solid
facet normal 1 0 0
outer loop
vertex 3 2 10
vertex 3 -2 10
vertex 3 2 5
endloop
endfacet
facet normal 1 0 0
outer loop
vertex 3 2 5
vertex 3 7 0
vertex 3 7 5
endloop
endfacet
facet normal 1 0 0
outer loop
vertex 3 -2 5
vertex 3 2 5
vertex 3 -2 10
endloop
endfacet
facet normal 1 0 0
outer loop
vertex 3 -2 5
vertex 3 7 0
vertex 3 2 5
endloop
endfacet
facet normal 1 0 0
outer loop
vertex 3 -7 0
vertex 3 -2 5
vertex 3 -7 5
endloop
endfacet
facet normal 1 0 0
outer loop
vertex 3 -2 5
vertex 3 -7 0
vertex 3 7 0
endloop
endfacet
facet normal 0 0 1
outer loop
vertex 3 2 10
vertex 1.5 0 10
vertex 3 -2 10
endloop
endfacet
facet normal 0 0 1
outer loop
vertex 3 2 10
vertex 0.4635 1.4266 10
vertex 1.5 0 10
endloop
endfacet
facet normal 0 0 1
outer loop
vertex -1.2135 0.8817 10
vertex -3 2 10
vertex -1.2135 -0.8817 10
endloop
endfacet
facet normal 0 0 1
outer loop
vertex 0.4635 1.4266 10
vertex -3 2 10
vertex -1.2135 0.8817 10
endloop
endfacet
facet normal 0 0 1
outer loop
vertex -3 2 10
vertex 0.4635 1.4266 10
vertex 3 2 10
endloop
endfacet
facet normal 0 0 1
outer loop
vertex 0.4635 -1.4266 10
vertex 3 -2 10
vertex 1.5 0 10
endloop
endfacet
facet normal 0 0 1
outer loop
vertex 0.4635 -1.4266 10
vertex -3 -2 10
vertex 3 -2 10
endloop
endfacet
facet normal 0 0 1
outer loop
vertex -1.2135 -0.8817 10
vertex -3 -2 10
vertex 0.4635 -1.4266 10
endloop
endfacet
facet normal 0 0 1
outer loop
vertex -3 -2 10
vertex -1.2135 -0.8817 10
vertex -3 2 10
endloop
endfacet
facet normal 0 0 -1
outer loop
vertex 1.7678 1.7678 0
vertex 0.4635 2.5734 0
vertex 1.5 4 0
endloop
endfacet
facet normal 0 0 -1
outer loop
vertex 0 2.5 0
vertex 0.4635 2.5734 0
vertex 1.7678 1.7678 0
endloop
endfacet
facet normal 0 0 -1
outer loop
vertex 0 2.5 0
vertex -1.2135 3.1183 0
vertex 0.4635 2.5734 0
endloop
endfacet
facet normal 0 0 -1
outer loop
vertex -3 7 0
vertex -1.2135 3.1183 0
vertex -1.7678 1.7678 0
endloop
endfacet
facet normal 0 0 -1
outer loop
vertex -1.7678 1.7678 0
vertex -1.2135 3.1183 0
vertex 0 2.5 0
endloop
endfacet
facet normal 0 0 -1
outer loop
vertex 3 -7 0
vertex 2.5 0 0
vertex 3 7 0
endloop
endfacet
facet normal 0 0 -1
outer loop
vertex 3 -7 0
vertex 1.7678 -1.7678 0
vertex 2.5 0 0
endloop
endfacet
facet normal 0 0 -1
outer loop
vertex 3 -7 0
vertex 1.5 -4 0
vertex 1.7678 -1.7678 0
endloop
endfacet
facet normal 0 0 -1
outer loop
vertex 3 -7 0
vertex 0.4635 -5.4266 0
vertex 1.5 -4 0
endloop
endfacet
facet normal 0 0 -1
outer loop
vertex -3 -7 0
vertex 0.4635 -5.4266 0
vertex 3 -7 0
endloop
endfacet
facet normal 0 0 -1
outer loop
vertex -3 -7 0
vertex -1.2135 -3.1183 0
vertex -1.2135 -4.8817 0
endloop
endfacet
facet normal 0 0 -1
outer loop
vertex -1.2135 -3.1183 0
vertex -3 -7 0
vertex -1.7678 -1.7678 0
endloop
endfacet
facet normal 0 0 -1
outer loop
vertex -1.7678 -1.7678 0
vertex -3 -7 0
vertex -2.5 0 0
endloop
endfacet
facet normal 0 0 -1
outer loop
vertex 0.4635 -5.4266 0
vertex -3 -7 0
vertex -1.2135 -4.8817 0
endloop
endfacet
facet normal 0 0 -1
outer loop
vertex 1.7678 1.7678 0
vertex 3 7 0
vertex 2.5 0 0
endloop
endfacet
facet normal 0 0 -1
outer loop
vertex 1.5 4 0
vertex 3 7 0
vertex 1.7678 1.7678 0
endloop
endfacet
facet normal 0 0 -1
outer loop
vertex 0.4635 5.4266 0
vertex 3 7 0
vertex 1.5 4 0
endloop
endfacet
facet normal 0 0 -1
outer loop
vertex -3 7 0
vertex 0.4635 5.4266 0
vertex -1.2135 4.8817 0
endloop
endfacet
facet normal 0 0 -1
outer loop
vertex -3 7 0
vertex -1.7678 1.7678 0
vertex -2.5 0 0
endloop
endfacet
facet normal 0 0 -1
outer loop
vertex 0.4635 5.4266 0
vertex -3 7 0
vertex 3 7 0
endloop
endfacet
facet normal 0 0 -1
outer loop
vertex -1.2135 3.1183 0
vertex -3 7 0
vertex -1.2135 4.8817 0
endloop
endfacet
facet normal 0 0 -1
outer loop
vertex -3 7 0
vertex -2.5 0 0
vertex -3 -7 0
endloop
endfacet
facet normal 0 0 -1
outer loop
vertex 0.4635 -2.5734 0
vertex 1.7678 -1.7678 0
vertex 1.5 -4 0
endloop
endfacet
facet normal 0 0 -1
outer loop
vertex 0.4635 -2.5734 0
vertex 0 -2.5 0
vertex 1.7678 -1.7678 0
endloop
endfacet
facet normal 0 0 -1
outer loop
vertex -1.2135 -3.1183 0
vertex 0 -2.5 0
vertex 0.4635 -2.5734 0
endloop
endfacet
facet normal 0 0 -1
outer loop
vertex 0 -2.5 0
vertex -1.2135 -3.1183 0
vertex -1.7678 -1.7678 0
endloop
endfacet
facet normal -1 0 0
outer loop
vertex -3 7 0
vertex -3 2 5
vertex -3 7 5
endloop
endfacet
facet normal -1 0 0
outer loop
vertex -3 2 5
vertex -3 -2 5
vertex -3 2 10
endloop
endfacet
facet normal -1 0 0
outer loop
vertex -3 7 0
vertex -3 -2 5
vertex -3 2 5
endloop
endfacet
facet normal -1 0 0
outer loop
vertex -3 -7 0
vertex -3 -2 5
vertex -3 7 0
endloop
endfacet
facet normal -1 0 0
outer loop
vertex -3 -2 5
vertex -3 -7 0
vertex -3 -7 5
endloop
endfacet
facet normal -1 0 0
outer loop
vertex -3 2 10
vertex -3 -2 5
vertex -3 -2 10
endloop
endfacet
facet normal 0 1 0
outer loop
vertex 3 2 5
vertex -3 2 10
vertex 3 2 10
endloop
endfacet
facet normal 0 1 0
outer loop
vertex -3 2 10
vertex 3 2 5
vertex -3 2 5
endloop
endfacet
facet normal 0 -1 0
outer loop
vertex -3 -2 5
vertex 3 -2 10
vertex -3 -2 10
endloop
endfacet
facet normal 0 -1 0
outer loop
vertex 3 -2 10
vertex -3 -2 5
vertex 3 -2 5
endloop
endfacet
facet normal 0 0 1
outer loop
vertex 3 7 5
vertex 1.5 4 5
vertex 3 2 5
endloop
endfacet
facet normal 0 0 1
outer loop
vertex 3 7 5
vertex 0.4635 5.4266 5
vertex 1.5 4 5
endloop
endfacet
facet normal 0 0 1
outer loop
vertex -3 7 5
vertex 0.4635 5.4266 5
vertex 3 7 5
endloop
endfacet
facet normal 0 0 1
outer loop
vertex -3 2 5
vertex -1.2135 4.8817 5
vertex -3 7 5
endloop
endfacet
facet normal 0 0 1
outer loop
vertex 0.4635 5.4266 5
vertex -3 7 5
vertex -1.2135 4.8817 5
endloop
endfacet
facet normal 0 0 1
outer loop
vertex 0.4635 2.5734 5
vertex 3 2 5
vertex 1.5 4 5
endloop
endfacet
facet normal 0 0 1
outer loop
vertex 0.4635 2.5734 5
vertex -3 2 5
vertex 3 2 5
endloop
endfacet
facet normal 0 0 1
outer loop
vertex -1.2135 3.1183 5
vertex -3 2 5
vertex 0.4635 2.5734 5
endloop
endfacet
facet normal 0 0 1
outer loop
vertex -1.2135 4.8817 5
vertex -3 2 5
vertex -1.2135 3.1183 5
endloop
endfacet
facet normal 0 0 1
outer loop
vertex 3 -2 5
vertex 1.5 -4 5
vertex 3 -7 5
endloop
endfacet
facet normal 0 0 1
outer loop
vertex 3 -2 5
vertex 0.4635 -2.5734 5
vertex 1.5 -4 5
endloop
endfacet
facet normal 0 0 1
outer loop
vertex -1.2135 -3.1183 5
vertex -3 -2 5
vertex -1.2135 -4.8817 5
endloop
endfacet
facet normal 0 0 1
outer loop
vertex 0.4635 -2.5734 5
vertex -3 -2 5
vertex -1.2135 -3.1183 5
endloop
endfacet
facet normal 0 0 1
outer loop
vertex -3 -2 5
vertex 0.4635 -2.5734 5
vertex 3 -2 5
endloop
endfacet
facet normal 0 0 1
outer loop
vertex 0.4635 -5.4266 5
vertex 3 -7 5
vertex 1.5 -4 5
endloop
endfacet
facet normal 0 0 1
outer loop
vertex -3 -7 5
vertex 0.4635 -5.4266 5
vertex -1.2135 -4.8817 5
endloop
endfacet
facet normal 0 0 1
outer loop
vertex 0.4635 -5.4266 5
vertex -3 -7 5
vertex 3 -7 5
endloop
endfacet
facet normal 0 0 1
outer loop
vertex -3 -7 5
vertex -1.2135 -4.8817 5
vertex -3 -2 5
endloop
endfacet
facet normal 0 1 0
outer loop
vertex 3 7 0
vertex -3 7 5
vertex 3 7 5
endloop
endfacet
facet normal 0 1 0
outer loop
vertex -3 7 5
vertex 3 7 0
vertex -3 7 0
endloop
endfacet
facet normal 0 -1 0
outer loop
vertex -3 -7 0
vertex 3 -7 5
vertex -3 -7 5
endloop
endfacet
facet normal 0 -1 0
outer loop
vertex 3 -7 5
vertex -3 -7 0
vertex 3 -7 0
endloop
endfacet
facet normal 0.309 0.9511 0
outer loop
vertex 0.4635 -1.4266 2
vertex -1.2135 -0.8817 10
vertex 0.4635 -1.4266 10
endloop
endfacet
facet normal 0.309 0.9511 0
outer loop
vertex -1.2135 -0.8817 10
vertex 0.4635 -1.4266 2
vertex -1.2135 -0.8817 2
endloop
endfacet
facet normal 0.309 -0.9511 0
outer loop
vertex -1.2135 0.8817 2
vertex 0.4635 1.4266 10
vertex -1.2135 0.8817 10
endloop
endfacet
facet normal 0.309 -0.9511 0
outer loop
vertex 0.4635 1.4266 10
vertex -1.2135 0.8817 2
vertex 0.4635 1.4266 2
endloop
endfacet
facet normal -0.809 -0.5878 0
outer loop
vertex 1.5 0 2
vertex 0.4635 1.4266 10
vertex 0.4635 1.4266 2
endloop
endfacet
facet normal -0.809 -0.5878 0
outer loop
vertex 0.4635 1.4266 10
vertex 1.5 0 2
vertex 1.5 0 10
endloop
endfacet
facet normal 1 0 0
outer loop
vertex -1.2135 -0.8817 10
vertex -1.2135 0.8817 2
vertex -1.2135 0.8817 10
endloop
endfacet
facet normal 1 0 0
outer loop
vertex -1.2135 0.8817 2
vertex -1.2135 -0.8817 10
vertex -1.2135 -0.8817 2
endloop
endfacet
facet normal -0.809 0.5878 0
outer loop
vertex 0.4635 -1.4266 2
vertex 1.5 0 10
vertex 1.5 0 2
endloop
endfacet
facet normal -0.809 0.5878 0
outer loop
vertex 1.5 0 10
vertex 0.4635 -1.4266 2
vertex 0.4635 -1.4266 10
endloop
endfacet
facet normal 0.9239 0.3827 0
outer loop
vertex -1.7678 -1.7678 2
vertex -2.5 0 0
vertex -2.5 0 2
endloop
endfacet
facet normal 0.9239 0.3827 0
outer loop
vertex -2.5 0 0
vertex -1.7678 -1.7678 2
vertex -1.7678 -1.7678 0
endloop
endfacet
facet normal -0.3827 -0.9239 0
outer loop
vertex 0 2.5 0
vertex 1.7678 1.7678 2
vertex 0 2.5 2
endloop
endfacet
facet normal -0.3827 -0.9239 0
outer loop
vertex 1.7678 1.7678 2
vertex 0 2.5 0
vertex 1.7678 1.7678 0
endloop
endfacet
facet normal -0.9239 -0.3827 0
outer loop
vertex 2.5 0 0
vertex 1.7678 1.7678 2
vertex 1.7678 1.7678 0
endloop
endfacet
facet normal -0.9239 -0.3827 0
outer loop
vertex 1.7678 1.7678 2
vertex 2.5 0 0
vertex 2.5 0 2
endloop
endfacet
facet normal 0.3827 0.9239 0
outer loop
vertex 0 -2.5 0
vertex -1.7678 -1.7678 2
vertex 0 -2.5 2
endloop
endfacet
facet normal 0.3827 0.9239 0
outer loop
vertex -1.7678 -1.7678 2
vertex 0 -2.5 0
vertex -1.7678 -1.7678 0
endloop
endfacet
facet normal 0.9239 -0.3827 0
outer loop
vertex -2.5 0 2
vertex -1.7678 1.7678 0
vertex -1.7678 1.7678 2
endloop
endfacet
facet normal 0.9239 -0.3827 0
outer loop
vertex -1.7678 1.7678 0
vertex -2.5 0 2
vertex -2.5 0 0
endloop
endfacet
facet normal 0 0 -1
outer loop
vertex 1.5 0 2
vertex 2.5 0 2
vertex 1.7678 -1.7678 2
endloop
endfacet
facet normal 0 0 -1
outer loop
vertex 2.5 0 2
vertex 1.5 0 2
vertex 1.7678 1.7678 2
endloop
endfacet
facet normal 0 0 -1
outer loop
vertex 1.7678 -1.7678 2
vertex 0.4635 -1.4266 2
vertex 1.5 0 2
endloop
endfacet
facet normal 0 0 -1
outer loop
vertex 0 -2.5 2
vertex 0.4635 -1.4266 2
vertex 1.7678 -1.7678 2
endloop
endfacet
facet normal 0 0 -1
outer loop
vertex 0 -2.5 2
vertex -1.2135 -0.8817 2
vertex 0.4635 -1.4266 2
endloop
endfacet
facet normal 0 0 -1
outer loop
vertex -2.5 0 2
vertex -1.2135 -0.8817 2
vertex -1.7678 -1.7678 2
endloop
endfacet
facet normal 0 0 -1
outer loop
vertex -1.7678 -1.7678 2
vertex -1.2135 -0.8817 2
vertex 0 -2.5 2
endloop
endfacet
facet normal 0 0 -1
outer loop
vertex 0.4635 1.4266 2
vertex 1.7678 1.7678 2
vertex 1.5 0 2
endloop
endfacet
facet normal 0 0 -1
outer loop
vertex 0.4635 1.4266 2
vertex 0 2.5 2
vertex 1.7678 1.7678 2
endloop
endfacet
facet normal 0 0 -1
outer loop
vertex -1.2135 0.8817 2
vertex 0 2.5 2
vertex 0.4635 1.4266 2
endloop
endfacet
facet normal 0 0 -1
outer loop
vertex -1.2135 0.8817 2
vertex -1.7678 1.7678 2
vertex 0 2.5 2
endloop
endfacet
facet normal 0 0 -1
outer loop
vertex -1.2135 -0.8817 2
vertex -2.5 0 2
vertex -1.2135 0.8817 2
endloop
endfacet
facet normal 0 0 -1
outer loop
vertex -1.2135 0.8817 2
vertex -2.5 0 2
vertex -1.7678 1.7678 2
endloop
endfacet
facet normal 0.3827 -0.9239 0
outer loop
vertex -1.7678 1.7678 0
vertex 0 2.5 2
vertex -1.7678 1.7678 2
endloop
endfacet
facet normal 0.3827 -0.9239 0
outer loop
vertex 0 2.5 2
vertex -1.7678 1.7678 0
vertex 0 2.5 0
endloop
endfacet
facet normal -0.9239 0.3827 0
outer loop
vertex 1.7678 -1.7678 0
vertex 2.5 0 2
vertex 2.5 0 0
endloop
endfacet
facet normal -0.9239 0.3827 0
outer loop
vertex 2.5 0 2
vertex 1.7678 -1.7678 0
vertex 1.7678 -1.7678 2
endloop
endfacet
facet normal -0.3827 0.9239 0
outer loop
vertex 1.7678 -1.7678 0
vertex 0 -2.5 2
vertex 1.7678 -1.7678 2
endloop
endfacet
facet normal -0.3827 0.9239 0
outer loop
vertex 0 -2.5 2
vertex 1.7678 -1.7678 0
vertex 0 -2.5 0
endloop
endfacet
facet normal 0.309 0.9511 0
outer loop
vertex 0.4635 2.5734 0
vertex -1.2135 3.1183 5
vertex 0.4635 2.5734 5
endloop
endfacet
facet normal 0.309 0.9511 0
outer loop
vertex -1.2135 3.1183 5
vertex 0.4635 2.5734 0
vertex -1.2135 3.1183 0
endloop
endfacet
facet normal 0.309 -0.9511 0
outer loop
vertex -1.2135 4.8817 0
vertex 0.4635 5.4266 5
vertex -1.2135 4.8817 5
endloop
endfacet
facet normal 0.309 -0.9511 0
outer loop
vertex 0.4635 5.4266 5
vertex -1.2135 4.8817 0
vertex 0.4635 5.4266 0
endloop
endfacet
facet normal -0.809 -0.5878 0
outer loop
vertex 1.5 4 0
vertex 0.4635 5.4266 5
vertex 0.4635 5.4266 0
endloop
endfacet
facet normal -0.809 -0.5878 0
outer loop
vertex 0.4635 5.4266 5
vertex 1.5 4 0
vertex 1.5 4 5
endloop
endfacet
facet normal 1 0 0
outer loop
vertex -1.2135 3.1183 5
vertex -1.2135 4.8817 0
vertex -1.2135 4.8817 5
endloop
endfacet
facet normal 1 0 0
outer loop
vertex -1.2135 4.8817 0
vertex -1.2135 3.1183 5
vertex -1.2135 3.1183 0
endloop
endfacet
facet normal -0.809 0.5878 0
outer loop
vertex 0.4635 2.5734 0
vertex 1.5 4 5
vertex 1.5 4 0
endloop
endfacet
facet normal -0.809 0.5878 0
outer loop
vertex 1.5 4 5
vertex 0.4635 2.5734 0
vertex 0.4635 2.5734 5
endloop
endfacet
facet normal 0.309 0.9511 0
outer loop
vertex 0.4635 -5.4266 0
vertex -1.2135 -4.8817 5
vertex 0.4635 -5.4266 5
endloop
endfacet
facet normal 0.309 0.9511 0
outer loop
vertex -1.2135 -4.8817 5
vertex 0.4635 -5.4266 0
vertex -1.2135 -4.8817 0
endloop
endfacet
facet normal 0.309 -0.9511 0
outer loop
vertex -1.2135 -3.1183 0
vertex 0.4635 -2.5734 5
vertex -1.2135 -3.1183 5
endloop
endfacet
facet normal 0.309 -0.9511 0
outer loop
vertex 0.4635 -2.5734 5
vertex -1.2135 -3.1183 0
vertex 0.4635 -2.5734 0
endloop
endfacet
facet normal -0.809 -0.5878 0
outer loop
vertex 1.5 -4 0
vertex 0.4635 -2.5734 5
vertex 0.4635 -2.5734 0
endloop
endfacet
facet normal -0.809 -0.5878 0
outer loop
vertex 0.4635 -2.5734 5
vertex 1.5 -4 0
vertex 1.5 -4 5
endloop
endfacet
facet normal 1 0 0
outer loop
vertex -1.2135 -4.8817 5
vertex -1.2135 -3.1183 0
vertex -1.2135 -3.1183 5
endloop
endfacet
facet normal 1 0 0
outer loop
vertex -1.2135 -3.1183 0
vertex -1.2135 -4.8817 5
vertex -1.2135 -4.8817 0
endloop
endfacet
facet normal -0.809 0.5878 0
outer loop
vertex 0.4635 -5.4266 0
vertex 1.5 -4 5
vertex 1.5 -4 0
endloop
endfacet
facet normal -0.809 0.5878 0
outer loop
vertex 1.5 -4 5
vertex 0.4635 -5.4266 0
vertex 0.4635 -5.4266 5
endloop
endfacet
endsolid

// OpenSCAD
module drawSpoolSpacer() {
difference() {
union() {
    translate([-3,-2,0])cube([6,4,10]);
    translate([-3,-7,0])cube([6,14,5]);

}
    cylinder(10,d=3,true);
    cylinder(2,d=5,true);
    translate([0,4,0]) cylinder(6,d=3,true);
    translate([0,-4,0]) cylinder(6,d=3,true);
}
}

drawSpoolSpacer();
